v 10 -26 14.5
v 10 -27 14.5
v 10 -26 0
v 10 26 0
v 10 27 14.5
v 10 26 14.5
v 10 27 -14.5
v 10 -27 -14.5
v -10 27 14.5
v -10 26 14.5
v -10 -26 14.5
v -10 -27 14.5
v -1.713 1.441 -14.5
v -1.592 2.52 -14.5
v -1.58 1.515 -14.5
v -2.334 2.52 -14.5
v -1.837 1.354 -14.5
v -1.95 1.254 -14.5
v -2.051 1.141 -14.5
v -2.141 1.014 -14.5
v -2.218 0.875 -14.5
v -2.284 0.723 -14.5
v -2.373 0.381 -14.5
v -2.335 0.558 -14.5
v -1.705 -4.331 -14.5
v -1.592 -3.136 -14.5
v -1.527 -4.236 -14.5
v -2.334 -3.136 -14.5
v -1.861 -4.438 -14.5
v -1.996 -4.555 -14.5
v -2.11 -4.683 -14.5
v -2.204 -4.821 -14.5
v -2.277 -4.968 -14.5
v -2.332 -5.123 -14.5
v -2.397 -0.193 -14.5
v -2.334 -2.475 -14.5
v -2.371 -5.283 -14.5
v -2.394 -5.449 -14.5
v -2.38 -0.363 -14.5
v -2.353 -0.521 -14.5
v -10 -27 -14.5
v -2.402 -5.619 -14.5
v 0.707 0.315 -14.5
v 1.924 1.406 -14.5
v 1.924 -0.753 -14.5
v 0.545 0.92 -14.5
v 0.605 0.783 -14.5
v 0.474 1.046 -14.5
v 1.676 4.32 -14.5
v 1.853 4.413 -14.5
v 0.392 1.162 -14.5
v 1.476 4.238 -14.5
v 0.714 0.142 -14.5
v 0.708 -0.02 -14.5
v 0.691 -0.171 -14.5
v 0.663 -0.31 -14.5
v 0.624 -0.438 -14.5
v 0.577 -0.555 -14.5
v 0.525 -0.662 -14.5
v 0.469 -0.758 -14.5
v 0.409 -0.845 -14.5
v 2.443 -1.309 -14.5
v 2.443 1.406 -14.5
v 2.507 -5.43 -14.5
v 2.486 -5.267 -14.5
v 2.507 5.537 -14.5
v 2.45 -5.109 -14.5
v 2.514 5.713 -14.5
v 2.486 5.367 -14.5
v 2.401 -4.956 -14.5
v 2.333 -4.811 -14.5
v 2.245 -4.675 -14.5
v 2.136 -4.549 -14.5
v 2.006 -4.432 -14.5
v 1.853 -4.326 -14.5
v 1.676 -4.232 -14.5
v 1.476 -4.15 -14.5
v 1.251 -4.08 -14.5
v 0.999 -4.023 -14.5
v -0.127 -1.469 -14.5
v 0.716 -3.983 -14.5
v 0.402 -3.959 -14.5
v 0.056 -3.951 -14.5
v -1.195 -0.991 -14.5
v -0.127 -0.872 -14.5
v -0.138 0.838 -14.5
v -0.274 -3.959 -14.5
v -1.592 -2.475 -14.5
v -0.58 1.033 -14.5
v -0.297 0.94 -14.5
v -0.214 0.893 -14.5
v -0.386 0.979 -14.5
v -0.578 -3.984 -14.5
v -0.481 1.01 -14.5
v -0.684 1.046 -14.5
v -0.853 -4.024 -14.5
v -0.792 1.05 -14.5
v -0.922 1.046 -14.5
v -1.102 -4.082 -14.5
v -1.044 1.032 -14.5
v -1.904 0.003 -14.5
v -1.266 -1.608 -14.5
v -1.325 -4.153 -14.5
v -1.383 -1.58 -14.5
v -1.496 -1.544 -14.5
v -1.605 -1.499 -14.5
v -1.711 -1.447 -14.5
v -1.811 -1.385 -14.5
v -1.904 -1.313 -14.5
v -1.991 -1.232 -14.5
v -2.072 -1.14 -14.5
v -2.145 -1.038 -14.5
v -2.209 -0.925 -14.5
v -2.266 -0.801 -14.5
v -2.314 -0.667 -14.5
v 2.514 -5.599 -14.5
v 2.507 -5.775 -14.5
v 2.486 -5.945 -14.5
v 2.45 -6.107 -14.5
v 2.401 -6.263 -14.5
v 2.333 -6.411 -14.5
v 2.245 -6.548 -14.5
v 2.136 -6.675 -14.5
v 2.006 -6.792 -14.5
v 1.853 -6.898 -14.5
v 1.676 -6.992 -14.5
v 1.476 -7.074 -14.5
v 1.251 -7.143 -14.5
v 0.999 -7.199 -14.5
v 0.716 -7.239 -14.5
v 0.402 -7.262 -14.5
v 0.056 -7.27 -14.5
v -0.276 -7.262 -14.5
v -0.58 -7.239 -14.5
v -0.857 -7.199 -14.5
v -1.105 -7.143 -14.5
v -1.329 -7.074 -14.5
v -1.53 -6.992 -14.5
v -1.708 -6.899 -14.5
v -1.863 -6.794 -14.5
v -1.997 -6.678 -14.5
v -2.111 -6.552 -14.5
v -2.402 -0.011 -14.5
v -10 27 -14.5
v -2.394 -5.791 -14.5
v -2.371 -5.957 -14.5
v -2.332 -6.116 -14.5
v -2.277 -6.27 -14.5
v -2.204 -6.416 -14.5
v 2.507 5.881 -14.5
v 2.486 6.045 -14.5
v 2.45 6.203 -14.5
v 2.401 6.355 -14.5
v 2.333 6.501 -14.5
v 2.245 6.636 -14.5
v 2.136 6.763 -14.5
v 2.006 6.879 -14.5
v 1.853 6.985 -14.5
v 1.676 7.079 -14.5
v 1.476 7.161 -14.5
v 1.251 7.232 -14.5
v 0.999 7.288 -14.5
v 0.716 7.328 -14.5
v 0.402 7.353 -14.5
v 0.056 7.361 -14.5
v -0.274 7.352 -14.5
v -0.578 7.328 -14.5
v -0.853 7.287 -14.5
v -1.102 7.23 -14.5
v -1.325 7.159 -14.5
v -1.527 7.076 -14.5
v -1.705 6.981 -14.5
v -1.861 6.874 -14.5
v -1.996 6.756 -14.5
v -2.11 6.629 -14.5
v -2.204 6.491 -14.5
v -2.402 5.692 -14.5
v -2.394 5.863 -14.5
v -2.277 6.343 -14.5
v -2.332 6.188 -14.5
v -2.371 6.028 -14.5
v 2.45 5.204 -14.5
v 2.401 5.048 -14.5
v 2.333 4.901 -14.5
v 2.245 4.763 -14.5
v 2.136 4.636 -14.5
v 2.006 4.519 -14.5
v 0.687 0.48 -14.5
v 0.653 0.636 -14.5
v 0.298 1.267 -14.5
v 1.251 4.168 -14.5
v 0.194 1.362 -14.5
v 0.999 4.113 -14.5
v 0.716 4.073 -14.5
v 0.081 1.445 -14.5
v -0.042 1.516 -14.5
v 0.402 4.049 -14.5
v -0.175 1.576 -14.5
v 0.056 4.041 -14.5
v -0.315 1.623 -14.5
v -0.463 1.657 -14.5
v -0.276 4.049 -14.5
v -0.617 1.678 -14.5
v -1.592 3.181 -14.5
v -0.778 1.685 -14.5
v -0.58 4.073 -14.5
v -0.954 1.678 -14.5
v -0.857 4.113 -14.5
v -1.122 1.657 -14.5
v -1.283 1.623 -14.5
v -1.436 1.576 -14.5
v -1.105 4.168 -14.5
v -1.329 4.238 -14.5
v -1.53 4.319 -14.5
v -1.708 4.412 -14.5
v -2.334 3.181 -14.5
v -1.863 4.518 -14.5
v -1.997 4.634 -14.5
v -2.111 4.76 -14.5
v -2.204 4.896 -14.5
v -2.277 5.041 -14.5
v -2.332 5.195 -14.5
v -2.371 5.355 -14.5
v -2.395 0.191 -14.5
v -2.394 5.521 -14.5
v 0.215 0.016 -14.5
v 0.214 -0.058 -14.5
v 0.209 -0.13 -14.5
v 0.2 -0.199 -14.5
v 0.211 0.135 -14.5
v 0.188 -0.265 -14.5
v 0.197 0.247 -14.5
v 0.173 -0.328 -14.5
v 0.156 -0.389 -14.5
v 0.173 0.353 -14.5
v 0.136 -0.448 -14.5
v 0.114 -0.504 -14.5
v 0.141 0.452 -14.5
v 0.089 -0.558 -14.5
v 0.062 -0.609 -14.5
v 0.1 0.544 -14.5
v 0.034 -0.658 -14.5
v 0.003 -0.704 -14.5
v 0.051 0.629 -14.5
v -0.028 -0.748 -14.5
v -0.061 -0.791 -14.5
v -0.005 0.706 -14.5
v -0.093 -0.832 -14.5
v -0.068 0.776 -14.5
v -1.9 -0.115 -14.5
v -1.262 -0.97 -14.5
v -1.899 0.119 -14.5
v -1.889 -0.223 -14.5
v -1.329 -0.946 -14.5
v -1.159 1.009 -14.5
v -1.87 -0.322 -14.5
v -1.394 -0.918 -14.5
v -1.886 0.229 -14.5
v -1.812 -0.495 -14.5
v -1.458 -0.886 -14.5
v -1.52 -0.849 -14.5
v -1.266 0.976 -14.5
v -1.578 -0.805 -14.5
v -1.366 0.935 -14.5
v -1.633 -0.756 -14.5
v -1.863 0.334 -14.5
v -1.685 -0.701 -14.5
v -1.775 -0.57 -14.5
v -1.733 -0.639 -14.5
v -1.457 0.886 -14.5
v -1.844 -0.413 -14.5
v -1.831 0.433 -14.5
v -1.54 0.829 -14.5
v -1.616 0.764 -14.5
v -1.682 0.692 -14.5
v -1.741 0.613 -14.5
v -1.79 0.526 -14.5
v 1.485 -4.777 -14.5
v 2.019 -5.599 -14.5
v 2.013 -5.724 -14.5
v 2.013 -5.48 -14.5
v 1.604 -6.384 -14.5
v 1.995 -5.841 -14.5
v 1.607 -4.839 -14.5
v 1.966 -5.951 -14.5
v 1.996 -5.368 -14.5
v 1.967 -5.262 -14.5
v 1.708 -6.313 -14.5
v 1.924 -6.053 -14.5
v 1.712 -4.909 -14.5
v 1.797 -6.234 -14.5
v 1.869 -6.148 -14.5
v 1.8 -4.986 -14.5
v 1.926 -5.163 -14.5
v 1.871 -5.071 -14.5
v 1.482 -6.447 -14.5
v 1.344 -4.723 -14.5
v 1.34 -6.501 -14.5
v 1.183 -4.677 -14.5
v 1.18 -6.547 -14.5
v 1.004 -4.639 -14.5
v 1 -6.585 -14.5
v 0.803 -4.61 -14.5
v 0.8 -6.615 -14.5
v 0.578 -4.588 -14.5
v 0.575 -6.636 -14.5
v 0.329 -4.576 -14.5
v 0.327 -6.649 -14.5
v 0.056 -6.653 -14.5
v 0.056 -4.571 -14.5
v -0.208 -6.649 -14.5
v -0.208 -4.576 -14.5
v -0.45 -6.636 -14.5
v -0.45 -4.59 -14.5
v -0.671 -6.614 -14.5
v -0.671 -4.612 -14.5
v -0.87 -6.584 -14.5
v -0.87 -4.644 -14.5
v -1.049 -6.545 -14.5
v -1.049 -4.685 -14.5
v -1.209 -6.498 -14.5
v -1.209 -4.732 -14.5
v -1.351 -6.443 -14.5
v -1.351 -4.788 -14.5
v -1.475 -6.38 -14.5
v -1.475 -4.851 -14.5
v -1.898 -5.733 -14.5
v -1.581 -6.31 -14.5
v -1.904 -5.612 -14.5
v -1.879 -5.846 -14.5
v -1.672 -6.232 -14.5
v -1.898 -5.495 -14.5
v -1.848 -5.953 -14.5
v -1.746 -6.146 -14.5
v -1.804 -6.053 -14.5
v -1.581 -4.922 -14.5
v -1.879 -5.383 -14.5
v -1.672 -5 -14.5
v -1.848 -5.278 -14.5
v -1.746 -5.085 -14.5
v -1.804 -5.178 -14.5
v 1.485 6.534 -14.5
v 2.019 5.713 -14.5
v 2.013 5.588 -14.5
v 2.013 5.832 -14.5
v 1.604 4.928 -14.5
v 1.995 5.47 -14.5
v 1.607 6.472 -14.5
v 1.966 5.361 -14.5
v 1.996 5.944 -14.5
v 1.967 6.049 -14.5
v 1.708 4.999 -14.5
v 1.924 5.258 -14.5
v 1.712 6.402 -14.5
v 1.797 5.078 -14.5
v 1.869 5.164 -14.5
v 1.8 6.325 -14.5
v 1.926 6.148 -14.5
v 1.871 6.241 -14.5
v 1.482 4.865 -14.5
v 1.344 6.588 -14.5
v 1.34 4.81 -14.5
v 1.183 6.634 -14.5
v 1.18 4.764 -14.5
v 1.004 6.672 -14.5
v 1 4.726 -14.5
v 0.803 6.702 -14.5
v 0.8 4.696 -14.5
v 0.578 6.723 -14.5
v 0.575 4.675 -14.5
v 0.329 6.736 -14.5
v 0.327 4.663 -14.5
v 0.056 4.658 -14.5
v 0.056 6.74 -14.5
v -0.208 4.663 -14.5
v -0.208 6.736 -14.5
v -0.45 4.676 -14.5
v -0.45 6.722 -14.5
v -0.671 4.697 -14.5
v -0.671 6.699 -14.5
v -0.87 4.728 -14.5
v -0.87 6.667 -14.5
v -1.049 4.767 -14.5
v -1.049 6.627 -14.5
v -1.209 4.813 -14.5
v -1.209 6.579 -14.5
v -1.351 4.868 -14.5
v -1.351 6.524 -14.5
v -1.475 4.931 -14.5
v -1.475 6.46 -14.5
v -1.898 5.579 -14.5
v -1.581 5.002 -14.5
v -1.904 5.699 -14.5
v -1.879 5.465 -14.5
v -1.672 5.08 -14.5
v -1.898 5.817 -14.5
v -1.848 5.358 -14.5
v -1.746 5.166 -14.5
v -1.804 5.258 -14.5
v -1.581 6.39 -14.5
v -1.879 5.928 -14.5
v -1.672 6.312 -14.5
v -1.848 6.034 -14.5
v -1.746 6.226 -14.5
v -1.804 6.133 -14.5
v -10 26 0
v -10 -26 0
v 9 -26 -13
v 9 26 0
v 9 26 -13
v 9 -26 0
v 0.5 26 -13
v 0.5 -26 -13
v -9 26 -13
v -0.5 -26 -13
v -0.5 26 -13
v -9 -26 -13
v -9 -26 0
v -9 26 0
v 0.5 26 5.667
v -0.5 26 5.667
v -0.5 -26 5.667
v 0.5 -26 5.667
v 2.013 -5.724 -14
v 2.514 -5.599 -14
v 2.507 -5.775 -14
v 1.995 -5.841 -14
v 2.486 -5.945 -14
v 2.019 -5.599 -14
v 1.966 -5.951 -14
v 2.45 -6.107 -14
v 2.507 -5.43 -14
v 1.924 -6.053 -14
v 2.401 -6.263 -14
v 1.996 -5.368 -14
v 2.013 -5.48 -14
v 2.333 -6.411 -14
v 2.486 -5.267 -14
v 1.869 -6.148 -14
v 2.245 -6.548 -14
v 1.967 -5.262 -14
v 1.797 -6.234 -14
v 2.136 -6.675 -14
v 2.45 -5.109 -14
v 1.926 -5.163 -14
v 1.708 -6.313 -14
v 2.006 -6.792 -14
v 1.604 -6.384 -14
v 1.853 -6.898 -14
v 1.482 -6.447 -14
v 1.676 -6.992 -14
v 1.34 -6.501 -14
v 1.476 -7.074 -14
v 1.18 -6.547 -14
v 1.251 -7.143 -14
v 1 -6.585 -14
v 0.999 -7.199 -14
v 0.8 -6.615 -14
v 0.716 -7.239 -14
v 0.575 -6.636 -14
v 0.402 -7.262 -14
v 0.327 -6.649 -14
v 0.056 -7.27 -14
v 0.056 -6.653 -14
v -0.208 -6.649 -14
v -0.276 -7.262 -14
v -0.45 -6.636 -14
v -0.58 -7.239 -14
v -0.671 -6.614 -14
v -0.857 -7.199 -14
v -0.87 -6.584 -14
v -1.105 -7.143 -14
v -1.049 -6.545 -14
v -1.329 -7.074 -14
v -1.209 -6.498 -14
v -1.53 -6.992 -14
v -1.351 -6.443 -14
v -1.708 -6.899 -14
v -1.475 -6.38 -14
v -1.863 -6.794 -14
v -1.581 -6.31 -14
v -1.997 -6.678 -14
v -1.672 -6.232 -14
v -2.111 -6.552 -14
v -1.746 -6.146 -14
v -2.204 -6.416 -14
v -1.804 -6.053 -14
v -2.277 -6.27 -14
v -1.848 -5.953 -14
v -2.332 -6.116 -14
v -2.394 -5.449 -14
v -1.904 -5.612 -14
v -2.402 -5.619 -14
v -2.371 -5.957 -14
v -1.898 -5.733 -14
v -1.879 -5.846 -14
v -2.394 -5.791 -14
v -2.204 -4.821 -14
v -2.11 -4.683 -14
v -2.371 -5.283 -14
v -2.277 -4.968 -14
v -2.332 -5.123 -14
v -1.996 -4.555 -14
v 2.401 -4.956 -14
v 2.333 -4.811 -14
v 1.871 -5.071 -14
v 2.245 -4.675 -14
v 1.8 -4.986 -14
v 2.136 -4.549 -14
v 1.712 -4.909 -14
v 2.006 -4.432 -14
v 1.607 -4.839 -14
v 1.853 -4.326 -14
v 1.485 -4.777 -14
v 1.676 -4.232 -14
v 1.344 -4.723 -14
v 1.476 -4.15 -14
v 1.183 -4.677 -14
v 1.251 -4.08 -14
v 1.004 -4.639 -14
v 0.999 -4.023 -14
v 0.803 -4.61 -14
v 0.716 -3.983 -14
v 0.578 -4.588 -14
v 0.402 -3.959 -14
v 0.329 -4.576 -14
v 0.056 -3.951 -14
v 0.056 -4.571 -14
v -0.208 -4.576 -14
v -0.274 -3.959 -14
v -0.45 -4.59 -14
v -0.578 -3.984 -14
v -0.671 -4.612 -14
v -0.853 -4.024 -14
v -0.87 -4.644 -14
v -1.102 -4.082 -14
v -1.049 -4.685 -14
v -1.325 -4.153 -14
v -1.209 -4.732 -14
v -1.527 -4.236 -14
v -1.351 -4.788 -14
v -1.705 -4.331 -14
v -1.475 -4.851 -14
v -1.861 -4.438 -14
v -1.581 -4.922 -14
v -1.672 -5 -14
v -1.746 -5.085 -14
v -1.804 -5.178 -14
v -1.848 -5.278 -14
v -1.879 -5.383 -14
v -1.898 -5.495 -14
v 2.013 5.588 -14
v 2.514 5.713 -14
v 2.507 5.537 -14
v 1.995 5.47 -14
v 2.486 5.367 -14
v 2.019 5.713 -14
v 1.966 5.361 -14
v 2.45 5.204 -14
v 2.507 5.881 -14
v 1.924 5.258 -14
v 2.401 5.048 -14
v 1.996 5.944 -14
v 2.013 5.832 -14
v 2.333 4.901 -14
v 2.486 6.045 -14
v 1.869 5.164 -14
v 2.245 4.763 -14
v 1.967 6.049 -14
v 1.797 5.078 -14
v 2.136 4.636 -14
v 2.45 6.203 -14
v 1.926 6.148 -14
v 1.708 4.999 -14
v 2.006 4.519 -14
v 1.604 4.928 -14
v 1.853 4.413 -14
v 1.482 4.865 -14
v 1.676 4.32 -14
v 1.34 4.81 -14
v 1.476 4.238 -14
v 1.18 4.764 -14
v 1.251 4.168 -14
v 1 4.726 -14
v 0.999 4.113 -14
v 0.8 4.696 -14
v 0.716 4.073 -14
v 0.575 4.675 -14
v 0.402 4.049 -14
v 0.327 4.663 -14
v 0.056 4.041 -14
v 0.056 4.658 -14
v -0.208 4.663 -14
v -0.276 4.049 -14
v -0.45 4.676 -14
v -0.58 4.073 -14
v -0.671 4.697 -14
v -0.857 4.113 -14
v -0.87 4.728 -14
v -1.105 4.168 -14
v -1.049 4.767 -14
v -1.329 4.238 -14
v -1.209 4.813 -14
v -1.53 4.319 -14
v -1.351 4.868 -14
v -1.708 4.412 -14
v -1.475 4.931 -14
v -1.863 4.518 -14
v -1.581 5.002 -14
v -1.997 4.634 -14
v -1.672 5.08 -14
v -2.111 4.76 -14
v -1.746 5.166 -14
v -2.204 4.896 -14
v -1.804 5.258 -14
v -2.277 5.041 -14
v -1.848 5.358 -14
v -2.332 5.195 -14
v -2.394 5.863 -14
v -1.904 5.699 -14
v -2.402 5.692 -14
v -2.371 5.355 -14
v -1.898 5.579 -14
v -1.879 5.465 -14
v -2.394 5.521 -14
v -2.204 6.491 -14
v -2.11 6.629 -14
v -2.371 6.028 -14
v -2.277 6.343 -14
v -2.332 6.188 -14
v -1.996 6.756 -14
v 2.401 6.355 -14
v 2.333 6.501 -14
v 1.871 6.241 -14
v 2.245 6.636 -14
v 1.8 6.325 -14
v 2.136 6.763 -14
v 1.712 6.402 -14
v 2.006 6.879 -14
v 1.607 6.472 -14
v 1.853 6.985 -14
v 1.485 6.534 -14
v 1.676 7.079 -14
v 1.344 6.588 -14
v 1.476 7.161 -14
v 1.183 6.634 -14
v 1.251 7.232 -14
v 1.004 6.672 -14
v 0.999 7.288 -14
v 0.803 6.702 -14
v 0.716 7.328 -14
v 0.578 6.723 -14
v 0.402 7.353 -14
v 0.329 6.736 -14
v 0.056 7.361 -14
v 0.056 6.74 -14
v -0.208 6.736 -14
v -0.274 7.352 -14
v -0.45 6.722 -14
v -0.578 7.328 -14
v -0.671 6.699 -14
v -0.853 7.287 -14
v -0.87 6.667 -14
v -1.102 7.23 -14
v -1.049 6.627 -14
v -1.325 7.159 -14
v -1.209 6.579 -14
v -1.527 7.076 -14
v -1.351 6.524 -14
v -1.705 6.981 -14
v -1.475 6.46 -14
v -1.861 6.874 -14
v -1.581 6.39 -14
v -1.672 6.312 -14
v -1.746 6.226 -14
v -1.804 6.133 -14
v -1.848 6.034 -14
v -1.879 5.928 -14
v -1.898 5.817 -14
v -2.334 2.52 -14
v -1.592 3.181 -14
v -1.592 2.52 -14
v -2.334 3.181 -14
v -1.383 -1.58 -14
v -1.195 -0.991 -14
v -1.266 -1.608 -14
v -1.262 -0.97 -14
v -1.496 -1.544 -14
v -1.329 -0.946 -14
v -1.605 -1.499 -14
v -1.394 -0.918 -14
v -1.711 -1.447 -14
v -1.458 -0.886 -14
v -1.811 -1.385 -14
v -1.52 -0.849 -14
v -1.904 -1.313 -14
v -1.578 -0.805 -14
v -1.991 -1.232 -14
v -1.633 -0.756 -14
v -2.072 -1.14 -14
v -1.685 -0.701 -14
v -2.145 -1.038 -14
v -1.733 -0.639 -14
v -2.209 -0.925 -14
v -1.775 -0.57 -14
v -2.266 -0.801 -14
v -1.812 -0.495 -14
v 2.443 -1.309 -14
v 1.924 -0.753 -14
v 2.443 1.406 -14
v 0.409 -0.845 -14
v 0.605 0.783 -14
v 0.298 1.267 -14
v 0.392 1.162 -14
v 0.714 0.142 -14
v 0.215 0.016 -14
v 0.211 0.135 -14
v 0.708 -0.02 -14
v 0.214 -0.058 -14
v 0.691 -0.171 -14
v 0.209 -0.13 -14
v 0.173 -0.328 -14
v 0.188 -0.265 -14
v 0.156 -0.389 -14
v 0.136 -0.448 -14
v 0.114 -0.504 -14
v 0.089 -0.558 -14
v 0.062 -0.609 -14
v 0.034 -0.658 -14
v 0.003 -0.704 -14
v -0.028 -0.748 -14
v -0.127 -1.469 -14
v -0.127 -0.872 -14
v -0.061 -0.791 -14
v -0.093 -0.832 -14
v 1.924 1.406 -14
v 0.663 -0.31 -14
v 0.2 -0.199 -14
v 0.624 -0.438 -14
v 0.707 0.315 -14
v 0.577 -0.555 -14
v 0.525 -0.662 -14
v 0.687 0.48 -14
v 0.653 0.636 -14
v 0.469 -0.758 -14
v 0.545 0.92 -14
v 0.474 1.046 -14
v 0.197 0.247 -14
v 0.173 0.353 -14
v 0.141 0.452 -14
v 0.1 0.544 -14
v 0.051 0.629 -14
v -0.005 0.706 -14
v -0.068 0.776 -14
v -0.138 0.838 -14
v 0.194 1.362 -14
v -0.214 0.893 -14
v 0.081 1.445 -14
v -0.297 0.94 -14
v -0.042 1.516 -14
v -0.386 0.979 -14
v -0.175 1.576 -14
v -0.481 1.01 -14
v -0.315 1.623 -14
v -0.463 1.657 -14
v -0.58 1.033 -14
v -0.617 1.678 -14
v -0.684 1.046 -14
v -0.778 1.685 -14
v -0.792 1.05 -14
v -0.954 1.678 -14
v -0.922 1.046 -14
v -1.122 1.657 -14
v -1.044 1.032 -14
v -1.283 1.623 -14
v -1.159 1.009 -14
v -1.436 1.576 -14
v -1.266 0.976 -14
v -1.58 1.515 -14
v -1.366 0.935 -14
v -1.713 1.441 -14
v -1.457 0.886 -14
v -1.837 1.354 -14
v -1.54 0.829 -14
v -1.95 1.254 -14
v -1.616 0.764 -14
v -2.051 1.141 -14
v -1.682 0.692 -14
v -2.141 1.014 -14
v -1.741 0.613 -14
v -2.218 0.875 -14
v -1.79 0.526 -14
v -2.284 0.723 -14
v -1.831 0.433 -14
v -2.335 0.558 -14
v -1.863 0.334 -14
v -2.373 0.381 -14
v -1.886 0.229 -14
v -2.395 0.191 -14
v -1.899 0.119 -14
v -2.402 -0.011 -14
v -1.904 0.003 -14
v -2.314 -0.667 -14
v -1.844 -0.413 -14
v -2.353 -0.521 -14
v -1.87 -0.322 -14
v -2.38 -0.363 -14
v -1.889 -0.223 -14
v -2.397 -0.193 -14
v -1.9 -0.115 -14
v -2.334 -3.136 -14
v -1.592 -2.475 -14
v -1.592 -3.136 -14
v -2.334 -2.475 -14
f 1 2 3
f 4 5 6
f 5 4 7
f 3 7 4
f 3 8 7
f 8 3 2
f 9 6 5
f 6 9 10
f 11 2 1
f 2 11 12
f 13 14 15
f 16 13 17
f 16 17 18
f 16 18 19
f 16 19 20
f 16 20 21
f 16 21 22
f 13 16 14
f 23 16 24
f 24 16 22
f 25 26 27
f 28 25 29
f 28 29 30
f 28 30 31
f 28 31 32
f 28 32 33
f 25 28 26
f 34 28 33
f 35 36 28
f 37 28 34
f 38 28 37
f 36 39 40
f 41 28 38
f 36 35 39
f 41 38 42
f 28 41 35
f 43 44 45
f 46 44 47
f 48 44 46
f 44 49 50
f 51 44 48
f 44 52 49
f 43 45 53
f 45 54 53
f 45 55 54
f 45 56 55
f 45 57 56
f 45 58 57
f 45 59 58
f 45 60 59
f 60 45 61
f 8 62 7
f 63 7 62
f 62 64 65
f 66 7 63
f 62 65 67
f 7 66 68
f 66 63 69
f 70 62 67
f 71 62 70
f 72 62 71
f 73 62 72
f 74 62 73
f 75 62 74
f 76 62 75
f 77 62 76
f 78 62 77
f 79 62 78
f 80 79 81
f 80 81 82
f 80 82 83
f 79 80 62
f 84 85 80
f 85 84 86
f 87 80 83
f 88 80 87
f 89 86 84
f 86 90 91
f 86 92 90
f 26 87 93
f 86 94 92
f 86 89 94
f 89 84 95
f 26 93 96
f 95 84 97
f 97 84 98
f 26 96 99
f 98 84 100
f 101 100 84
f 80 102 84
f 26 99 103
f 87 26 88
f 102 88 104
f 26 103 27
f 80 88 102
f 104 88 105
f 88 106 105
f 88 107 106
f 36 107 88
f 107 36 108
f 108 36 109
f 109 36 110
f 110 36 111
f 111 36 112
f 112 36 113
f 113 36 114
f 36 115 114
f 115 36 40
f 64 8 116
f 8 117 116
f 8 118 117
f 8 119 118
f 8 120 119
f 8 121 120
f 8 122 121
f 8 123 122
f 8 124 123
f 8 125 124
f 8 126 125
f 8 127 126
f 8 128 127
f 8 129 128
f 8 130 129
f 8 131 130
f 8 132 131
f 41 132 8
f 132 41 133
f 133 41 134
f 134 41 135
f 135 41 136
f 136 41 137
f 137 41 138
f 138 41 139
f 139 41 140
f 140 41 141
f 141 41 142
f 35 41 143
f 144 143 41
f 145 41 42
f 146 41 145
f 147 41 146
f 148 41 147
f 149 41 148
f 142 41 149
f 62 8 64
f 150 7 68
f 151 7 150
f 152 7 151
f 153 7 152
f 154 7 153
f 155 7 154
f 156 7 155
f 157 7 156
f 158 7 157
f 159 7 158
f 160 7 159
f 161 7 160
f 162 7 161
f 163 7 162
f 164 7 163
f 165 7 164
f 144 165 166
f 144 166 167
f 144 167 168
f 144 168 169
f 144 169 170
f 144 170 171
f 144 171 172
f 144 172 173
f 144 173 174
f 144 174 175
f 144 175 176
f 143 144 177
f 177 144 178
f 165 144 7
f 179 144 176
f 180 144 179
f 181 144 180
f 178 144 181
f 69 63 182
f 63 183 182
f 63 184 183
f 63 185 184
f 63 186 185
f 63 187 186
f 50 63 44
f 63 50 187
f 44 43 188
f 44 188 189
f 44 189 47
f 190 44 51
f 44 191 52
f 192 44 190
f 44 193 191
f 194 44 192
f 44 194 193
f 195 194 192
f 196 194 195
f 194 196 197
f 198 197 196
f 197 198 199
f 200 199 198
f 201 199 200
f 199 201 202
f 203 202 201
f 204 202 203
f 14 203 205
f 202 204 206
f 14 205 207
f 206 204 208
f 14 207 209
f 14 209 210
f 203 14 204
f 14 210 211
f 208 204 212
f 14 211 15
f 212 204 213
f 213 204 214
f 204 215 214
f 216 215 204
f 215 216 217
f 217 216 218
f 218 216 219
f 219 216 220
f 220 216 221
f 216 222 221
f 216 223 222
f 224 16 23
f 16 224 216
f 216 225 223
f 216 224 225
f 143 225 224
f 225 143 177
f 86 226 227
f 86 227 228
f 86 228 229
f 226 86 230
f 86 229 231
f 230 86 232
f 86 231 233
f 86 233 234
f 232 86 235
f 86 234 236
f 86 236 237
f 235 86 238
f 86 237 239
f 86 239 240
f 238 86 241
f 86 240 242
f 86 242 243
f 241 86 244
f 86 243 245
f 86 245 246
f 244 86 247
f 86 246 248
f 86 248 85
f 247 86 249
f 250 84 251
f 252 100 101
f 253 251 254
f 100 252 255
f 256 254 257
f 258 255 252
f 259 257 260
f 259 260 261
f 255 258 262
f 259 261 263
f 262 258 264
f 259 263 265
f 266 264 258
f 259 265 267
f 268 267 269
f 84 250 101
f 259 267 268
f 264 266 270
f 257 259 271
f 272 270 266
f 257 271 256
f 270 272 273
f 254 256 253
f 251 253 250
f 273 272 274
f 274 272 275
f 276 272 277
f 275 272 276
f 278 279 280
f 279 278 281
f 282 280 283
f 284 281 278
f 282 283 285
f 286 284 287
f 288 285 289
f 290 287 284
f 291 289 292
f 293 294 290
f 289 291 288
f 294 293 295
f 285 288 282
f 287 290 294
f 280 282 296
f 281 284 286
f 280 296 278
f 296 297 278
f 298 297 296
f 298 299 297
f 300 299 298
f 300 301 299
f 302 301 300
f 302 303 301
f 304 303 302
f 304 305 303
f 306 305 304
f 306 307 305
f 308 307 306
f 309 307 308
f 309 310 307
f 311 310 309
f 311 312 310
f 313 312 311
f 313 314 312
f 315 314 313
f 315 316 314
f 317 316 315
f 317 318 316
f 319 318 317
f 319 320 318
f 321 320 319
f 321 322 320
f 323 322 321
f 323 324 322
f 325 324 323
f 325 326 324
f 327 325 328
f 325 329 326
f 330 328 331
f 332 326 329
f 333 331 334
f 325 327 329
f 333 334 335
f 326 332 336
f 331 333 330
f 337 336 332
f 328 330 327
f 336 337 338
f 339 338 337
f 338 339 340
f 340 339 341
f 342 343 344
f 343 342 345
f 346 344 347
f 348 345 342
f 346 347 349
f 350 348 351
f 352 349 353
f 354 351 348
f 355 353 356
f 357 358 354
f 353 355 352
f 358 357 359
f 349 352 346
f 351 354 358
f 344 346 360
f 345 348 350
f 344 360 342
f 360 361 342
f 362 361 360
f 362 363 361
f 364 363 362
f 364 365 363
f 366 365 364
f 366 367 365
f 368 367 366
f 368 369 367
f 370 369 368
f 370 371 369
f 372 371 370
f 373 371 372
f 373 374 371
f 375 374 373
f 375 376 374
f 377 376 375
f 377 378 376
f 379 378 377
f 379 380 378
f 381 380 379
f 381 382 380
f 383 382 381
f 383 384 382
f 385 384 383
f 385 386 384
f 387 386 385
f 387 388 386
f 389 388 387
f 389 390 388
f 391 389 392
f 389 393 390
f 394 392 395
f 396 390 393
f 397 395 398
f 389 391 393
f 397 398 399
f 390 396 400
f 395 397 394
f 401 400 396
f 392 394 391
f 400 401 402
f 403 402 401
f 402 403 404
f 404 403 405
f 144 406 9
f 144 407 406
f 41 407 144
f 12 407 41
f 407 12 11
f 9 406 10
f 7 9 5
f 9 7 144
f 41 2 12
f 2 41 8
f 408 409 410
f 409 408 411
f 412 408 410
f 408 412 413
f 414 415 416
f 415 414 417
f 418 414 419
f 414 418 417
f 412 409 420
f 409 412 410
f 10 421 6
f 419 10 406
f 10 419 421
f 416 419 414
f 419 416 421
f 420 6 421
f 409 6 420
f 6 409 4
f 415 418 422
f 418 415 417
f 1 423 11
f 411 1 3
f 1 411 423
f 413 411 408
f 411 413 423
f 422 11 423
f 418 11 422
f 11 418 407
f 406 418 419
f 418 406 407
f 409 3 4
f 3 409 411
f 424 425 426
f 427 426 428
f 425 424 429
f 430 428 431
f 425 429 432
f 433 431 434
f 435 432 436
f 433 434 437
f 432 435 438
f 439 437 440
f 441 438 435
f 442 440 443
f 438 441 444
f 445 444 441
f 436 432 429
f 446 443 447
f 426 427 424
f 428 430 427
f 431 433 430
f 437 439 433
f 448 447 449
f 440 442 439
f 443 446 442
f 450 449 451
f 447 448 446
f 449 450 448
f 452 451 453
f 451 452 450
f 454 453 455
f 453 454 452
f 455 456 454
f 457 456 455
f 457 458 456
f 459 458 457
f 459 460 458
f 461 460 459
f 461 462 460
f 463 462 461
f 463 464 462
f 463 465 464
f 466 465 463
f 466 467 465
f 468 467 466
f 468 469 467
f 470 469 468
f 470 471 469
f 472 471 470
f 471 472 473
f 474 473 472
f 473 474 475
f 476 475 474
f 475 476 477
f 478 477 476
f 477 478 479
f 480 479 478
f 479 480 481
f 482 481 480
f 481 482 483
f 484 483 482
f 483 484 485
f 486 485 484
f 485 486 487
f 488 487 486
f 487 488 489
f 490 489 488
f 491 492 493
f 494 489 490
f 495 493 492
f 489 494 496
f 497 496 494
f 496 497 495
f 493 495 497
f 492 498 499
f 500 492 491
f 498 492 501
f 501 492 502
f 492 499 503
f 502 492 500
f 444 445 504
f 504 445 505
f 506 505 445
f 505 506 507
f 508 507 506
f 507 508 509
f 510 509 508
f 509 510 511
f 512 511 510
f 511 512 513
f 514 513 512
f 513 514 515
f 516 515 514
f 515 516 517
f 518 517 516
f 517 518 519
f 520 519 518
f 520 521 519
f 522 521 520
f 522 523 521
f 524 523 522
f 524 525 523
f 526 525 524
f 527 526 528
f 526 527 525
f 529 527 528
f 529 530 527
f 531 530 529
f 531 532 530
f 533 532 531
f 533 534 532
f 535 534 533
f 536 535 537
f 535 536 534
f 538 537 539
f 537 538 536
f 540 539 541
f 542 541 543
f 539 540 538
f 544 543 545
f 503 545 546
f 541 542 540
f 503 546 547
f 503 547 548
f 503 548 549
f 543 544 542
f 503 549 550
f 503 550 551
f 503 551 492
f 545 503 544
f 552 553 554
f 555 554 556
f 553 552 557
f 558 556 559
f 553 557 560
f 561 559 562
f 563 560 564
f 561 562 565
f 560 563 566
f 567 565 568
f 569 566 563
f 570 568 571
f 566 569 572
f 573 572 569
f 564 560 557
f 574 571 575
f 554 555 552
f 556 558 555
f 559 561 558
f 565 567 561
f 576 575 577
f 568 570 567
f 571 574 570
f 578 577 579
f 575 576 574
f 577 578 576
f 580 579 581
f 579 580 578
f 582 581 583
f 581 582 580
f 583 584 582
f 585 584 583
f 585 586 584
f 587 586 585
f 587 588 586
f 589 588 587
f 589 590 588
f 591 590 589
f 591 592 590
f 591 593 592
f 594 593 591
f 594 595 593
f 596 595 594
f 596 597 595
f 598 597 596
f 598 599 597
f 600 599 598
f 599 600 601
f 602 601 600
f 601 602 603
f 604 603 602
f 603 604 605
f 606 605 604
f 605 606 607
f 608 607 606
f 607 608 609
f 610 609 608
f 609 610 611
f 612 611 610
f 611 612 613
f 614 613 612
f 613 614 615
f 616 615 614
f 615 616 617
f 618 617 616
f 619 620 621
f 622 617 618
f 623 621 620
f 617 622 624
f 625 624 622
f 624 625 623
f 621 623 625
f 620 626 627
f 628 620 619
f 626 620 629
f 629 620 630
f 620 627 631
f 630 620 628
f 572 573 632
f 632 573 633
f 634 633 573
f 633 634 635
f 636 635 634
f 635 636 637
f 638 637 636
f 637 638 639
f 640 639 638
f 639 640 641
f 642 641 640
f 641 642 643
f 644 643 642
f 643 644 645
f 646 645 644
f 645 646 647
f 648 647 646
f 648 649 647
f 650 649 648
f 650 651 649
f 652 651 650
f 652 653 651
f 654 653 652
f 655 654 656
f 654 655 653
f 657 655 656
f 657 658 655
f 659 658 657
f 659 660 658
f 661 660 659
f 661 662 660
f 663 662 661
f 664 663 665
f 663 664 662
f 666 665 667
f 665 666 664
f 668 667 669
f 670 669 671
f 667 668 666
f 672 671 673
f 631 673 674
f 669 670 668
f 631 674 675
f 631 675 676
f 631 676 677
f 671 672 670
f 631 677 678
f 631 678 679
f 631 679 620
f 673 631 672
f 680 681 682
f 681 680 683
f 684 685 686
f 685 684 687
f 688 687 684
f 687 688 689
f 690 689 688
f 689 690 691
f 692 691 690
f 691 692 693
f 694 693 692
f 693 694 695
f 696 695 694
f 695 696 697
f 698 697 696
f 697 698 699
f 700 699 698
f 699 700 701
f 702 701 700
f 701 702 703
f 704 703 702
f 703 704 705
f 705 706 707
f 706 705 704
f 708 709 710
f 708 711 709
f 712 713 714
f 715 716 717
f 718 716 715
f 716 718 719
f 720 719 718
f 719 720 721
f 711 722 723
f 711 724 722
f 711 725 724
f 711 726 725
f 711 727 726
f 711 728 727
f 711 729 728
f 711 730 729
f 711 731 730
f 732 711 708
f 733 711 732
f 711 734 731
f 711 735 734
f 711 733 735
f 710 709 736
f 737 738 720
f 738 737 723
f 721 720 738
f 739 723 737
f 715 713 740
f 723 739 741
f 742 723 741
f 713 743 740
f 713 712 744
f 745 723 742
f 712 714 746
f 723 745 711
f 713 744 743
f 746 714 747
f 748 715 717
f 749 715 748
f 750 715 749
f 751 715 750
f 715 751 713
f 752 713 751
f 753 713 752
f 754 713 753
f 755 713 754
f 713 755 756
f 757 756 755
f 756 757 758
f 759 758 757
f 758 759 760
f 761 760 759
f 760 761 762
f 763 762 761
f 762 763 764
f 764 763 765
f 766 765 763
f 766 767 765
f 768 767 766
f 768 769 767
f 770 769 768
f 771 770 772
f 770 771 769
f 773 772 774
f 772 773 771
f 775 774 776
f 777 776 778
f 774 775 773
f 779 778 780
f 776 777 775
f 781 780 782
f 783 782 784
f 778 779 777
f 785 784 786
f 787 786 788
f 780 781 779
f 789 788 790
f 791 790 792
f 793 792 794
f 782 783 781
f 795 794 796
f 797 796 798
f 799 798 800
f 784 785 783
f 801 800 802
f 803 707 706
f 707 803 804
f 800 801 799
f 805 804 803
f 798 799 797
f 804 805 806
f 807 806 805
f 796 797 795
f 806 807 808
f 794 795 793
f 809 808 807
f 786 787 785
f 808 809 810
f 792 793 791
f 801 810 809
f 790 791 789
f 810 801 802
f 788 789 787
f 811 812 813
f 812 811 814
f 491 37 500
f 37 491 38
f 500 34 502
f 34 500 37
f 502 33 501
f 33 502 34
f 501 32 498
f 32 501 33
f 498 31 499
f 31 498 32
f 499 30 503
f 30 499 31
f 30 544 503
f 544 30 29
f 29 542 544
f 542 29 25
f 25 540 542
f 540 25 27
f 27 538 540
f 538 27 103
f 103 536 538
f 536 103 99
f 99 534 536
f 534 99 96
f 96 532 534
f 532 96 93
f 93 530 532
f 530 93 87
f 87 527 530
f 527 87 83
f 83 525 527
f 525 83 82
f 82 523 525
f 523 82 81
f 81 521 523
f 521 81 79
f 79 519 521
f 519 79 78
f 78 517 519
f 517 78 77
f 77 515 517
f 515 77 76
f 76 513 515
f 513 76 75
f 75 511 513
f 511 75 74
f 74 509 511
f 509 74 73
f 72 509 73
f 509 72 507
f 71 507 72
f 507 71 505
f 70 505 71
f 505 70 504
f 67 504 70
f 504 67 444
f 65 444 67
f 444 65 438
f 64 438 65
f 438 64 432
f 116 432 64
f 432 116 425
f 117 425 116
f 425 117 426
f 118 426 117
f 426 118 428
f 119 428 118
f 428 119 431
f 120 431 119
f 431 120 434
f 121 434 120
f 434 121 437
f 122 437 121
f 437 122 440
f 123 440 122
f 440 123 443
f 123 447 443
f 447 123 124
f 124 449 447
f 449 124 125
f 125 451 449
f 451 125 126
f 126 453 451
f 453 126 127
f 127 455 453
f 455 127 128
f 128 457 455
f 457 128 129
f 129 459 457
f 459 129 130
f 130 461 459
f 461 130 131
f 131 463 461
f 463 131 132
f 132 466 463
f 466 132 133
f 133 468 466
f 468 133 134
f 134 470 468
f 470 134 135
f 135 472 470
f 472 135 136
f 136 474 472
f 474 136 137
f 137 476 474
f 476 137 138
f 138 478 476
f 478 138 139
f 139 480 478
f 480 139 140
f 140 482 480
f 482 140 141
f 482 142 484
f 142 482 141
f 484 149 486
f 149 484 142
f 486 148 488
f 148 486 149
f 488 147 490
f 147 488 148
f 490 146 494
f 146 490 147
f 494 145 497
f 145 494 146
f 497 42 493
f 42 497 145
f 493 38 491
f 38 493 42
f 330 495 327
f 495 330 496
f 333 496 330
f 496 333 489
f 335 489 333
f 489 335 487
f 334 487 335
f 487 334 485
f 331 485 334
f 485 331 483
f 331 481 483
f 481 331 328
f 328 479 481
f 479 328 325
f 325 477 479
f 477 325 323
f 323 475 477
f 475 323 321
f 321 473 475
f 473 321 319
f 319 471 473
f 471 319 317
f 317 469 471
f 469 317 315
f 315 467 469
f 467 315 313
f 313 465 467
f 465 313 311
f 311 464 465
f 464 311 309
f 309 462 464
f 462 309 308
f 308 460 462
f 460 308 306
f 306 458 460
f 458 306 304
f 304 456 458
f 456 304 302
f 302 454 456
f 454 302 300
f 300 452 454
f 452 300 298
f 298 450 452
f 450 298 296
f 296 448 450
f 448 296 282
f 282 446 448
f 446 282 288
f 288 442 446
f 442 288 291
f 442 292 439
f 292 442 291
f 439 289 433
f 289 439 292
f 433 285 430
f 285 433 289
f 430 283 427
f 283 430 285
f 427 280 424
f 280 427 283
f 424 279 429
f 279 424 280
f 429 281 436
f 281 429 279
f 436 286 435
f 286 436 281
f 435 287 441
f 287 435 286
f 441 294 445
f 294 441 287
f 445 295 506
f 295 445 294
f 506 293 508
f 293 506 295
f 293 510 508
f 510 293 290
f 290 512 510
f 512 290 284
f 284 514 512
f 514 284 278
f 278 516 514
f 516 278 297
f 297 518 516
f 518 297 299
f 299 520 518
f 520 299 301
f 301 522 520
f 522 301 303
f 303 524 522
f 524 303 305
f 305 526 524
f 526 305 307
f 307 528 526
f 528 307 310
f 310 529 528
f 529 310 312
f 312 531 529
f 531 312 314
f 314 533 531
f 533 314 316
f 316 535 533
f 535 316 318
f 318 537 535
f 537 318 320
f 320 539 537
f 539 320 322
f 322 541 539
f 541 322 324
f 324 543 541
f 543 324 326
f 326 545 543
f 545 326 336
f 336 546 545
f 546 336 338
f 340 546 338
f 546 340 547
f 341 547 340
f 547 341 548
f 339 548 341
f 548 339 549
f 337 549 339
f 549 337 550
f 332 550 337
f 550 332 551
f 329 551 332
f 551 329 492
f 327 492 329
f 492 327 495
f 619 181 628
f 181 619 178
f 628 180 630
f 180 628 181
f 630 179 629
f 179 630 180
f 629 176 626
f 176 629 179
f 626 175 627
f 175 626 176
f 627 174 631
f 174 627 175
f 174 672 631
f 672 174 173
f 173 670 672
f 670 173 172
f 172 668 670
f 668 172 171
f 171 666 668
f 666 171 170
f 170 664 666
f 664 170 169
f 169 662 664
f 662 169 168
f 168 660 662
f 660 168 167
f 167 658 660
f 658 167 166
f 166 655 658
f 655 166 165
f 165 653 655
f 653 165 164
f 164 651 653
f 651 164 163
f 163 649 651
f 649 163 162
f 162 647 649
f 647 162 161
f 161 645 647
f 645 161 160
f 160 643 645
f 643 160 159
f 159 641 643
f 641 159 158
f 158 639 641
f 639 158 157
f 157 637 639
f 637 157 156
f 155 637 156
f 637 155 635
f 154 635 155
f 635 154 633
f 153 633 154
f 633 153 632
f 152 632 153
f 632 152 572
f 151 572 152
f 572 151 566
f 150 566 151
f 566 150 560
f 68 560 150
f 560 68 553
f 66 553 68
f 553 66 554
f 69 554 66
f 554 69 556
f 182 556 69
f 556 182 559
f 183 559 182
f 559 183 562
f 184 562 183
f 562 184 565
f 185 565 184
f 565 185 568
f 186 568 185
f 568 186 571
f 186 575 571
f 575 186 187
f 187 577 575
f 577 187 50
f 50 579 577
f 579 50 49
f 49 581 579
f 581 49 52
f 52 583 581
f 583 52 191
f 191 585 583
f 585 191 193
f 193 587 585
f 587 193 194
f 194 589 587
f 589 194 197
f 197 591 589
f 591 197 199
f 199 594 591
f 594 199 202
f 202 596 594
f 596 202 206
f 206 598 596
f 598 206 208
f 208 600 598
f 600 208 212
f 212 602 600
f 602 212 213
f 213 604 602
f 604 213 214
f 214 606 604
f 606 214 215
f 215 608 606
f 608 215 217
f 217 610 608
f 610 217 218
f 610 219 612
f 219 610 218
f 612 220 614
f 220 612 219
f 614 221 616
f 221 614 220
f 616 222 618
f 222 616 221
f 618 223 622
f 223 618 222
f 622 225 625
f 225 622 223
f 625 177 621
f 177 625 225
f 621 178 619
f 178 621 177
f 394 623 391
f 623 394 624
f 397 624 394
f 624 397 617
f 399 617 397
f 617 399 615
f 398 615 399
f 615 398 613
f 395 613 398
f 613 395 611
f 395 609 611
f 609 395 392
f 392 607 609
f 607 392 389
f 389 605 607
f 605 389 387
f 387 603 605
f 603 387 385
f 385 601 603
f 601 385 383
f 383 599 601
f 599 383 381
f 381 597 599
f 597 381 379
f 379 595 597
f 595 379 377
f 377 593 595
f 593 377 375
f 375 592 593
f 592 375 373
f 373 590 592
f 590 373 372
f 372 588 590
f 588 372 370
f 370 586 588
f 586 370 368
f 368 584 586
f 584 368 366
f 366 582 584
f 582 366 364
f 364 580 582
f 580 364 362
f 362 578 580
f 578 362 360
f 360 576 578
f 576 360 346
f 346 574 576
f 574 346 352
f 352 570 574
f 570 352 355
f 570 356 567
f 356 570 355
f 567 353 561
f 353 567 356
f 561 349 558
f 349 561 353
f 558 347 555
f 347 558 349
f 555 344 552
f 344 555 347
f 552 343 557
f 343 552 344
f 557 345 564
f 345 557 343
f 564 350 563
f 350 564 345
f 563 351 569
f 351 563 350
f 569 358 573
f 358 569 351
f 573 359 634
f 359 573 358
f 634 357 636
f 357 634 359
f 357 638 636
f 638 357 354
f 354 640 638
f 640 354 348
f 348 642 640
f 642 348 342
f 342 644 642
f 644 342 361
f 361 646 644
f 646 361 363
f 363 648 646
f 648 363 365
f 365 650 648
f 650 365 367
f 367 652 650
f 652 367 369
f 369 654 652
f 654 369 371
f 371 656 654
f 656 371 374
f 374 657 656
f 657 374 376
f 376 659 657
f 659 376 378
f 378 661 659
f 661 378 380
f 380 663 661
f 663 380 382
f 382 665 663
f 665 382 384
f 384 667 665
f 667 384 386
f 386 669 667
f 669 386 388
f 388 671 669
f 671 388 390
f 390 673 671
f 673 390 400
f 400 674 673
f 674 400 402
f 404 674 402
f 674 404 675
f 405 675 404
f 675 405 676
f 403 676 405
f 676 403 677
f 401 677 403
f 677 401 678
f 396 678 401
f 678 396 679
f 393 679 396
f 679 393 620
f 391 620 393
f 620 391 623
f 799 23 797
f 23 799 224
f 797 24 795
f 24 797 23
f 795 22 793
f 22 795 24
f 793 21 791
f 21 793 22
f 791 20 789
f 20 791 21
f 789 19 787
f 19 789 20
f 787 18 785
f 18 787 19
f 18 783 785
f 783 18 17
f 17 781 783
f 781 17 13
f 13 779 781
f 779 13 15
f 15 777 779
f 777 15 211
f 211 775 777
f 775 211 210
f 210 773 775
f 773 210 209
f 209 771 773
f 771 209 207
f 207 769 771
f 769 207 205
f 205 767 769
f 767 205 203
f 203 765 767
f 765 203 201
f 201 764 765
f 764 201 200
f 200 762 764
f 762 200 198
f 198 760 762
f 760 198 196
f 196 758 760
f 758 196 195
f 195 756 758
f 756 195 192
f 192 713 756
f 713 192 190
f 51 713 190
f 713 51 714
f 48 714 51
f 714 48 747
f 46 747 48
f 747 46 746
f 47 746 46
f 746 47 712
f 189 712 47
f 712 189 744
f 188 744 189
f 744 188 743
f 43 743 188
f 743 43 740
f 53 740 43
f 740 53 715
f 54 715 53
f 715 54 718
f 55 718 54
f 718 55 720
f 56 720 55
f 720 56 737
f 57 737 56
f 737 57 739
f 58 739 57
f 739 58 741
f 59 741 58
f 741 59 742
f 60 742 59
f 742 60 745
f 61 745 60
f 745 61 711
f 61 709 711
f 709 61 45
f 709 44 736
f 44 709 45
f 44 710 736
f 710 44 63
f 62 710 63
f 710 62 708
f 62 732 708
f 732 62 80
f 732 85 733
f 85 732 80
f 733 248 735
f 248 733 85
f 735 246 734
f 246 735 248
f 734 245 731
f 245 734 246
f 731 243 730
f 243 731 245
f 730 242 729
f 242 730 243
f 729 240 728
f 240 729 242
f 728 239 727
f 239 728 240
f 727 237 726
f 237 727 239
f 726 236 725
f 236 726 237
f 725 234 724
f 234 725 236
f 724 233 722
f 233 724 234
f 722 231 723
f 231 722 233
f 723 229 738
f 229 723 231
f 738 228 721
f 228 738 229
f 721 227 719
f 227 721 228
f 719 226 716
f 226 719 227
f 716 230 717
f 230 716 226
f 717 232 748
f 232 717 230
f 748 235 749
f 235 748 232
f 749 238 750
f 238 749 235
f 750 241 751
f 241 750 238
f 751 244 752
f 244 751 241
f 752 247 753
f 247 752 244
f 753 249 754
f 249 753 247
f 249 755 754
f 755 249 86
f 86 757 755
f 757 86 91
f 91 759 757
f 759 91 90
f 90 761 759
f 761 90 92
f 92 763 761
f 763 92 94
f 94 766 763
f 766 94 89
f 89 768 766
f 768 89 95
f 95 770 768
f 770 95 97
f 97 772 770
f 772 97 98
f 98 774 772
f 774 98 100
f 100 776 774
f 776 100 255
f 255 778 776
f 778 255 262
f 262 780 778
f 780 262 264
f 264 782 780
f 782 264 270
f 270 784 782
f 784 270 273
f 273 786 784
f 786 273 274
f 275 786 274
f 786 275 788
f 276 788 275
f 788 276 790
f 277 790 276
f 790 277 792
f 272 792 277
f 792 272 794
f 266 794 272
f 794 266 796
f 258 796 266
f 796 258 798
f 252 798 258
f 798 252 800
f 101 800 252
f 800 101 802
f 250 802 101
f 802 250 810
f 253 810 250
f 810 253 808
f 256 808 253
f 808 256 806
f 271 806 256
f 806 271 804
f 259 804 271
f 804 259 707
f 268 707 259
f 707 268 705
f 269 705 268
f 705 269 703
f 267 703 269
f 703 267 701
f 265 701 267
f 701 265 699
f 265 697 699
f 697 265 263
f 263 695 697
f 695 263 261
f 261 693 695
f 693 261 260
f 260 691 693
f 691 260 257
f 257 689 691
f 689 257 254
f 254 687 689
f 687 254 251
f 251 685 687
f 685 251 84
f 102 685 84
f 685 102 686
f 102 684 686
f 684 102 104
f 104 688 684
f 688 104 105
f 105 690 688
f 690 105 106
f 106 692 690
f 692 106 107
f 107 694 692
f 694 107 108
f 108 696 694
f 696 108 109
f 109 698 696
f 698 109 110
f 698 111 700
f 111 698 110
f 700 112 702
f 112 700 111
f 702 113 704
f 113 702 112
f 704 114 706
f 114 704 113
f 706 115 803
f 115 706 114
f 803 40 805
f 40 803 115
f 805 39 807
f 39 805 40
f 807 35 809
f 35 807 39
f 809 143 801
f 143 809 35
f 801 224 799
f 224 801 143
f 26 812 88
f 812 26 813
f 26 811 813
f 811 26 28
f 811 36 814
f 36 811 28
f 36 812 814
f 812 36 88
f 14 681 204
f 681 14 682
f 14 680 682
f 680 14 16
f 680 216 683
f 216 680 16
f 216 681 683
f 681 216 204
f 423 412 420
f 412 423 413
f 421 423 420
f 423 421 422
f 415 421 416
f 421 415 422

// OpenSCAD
version = "0.5.0";

function toUnits(inches=0, sixteenths=0) = (inches * 16) + sixteenths;


voidLength = toUnits(3,4);
voidWidth = toUnits(1,2);
voidDepth = toUnits(1,12);

shellLength = voidLength + 2;
shellWidth = voidWidth + 2;
shellDepth = voidDepth+ 1;


difference() {
    cube([shellWidth,shellLength, shellDepth],true);
    translate ([0,0,1]) cube([voidWidth,voidLength, voidDepth],true);
    translate ([0,0,voidDepth/2]) cube([shellWidth + 2,voidLength, voidDepth],true);
        translate ([0, 0, - (shellDepth/2) + 0.5 ])
    rotate ([0,180,270])
        linear_extrude (1) {
            scale (.5, .5, .5)
            text(version, halign = "center", valign = "center");
        } ;
    
}
translate ([0,0, - (voidDepth/6) + 1]) cube([1,shellLength, 2 * voidDepth/3], true);
    
